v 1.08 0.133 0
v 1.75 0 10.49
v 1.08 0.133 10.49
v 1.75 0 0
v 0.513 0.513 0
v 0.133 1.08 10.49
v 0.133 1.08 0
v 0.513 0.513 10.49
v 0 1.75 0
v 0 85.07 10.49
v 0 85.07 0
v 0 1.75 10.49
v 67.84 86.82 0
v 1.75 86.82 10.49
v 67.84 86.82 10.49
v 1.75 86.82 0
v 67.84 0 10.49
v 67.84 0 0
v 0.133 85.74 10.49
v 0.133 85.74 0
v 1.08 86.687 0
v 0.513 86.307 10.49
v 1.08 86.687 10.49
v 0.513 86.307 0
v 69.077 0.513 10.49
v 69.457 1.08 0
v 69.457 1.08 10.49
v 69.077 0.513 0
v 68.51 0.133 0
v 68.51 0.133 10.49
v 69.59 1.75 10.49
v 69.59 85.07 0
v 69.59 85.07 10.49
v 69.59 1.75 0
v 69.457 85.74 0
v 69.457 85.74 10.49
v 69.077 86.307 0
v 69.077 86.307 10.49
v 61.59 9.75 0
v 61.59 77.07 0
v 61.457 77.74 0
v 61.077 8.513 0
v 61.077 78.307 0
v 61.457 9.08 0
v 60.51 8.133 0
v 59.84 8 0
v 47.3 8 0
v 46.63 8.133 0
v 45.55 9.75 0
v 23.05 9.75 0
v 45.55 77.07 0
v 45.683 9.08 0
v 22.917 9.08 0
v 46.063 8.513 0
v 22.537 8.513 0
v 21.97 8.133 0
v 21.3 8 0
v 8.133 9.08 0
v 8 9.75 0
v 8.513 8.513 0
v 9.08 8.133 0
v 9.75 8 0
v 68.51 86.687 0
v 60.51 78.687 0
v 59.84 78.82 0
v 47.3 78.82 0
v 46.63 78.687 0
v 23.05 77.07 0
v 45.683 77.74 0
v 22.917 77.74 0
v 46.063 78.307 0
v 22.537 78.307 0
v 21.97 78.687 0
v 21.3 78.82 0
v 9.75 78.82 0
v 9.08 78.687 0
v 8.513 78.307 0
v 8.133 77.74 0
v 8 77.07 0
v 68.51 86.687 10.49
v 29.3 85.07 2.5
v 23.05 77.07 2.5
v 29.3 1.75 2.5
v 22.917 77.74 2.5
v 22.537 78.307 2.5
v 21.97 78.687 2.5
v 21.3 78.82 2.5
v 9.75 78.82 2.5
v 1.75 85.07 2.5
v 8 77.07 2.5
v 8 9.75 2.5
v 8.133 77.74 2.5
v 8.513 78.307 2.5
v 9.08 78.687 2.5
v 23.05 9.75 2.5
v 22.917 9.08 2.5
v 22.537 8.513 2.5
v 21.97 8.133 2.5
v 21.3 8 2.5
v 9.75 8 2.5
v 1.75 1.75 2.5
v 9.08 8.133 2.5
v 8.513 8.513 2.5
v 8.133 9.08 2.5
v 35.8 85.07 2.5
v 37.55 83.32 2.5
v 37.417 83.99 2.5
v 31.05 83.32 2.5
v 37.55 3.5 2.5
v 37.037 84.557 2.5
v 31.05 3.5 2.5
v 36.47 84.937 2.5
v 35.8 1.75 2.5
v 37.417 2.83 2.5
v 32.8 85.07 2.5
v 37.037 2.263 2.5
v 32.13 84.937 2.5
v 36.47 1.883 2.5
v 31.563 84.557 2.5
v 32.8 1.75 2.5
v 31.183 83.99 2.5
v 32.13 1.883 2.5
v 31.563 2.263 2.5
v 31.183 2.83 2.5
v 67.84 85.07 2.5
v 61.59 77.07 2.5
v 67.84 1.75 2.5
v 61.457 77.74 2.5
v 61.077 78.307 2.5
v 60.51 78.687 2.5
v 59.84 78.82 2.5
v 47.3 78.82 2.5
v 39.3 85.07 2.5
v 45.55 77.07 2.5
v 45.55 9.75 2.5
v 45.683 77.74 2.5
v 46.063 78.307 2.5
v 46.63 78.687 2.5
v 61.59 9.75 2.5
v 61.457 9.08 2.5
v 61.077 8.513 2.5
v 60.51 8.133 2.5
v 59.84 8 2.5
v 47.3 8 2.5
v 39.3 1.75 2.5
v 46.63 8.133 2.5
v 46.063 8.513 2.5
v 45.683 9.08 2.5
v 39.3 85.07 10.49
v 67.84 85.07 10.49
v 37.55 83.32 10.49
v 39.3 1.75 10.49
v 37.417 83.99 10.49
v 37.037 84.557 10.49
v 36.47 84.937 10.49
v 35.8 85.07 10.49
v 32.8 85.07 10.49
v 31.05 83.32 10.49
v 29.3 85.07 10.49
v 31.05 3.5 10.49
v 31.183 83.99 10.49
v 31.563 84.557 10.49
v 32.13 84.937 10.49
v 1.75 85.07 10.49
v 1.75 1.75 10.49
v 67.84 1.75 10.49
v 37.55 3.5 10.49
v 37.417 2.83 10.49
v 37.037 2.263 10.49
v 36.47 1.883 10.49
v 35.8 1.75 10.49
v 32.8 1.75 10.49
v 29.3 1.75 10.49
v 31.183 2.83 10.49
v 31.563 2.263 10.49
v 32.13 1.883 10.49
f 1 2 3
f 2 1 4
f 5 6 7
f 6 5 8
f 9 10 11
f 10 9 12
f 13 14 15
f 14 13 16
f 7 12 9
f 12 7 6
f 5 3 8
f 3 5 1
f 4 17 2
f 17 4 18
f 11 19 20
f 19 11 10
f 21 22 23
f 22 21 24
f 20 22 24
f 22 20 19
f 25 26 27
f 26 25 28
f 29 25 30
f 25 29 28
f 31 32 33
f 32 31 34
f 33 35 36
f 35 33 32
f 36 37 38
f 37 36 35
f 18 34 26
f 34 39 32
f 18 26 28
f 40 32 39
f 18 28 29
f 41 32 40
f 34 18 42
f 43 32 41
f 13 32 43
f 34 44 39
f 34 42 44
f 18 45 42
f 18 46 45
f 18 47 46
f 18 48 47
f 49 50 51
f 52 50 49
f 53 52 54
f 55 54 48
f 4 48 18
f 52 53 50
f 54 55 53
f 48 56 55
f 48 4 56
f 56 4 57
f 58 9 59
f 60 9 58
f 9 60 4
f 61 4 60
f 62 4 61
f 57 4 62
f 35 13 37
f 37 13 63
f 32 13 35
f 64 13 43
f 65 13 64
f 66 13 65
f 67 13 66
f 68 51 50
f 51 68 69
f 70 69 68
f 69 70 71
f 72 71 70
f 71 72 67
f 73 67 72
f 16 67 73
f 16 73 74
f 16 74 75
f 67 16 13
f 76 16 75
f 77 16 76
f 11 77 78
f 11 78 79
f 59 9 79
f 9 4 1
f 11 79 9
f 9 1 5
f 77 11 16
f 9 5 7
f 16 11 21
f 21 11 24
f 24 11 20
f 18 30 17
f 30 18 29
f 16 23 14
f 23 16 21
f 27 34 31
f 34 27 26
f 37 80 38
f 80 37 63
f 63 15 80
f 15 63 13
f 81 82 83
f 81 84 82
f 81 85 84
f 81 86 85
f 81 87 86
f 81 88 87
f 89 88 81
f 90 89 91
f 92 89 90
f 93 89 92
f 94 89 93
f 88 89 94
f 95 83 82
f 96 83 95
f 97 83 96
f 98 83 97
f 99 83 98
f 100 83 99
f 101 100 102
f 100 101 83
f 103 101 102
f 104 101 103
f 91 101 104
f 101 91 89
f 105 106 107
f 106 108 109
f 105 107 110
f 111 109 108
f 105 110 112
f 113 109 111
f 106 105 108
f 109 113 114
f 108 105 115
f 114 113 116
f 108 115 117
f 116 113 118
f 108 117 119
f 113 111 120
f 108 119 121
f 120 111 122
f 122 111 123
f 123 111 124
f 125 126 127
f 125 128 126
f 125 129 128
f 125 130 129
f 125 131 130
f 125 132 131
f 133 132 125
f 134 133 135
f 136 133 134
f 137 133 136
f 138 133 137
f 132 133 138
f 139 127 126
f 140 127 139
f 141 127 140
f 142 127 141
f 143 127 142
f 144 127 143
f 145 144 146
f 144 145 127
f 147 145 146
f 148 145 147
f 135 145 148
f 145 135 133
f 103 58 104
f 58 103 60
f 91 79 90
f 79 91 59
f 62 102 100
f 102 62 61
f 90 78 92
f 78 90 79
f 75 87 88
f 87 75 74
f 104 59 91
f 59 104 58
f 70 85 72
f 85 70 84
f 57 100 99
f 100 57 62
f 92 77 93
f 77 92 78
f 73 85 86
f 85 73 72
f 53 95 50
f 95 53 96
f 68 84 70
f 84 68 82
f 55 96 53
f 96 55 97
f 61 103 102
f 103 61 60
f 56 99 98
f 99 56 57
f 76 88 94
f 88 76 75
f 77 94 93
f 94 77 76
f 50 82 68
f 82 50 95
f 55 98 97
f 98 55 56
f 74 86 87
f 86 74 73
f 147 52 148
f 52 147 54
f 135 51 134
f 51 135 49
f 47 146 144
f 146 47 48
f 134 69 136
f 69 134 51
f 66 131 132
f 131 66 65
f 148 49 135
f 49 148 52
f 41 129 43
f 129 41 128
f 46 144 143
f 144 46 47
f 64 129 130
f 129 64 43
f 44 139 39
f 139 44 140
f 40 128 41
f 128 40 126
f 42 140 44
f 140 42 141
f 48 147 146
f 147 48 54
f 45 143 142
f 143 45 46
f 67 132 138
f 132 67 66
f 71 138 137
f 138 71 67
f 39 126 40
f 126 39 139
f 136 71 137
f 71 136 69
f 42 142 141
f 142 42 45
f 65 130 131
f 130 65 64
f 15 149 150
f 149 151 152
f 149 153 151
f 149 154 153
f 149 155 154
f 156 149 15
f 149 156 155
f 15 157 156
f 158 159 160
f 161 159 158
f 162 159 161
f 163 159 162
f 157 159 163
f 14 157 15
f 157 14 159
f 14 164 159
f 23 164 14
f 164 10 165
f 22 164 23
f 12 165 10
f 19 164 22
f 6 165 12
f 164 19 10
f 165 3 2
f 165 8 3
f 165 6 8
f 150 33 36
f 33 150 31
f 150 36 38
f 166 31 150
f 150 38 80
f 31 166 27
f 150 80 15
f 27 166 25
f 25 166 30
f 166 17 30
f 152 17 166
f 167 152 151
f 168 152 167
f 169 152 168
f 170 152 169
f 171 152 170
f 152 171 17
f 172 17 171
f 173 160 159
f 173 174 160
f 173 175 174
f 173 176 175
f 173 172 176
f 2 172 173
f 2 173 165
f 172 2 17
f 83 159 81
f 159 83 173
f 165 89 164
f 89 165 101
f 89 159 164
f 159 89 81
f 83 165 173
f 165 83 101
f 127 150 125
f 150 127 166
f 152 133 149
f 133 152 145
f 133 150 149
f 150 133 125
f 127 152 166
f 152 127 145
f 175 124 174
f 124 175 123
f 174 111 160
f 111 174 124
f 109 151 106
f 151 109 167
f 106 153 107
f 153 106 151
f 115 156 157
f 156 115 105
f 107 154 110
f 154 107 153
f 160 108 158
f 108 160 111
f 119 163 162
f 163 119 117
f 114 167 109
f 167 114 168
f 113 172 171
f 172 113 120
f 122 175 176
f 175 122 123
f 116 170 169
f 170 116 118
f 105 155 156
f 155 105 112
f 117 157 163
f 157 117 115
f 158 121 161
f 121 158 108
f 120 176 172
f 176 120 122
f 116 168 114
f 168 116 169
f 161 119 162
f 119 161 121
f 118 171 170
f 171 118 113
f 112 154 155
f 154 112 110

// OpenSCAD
split = 10;
tolerance = 0.3;
length = 82.72;
leftHalfWidth = 26.95;
rightHalfWidth = 27.94;
wallHeight = 8;
wallThickness = 1.75;
baseWidth = 8;
baseThickness = 2.5;

module end_of_parameters_dummy() {}

//use <roundedsquare.scad>;
module roundedSquare(size=[10,10], radius=1, center=false, $fn=16) {
    size1 = (size+0==size) ? [size,size] : size;
    if (radius <= 0) {
        square(size1, center=center);
    }
    else {
        translate(center ? -size1/2 : [0,0])
        hull() {
            translate([radius,radius]) circle(r=radius);
            translate([size1[0]-radius,radius]) circle(r=radius);
            translate([size1[0]-radius,size1[1]-radius]) circle(r=radius);
            translate([radius,size1[1]-radius]) circle(r=radius);
        }
    }
}

module roundedCube(size=[10,10,10], radius=1, center=false, $fn=16) {
    linear_extrude(height=size[2])
    roundedSquare(size=[size[0],size[1]], radius=radius, center=center);
}

module roundedOpenTopBox(size=[10,10,10], radius=2, wall=1, solid=false) {
    render(convexity=2)
    difference() {
        linear_extrude(height=size[2]) roundedSquare(size=[size[0],size[1]], radius=radius);
        if (!solid) {
            translate([0,0,wall])
            linear_extrude(height=size[2]-wall)
            translate([wall,wall]) roundedSquare(size=[size[0]-2*wall,size[1]-2*wall], radius=radius-wall);
        }
    }
}


module dummy() {}
nudge = 0.01;

w1 = leftHalfWidth + 2*tolerance + 2*wallThickness;
w2 = rightHalfWidth + 2*tolerance + 2*wallThickness;
innerSplit = split - 2*wallThickness;
l = length+2*wallThickness+2*tolerance;

render(convexity=3)
difference() {
    linear_extrude(height=baseThickness) roundedSquare([w1+innerSplit+w2,l],radius=wallThickness);
    translate([baseWidth,baseWidth,-nudge]) linear_extrude(height=baseThickness+2*nudge) roundedSquare([w1-baseWidth*2,l-baseWidth*2],radius=wallThickness);
    translate([baseWidth+w1+innerSplit,baseWidth,-nudge]) linear_extrude(height=baseThickness+2*nudge) roundedSquare([w2-baseWidth*2,l-baseWidth*2],radius=wallThickness);
}
render(convexity=3)
translate([0,0,baseThickness-nudge])
difference() {
    linear_extrude(height=wallHeight) roundedSquare([w1+innerSplit+w2,l],radius=wallThickness);
    translate([wallThickness,wallThickness,-nudge]) cube([w1-wallThickness*2,l-wallThickness*2,wallHeight+2*nudge]);
   translate([wallThickness+w1+innerSplit,wallThickness,-nudge]) cube([w2-wallThickness*2,l-wallThickness*2,wallHeight+2*nudge]);
    #translate([w1,wallThickness,-nudge]) linear_extrude(height=wallHeight+2*nudge) roundedSquare([innerSplit,l-wallThickness*2],radius=wallThickness);

}
